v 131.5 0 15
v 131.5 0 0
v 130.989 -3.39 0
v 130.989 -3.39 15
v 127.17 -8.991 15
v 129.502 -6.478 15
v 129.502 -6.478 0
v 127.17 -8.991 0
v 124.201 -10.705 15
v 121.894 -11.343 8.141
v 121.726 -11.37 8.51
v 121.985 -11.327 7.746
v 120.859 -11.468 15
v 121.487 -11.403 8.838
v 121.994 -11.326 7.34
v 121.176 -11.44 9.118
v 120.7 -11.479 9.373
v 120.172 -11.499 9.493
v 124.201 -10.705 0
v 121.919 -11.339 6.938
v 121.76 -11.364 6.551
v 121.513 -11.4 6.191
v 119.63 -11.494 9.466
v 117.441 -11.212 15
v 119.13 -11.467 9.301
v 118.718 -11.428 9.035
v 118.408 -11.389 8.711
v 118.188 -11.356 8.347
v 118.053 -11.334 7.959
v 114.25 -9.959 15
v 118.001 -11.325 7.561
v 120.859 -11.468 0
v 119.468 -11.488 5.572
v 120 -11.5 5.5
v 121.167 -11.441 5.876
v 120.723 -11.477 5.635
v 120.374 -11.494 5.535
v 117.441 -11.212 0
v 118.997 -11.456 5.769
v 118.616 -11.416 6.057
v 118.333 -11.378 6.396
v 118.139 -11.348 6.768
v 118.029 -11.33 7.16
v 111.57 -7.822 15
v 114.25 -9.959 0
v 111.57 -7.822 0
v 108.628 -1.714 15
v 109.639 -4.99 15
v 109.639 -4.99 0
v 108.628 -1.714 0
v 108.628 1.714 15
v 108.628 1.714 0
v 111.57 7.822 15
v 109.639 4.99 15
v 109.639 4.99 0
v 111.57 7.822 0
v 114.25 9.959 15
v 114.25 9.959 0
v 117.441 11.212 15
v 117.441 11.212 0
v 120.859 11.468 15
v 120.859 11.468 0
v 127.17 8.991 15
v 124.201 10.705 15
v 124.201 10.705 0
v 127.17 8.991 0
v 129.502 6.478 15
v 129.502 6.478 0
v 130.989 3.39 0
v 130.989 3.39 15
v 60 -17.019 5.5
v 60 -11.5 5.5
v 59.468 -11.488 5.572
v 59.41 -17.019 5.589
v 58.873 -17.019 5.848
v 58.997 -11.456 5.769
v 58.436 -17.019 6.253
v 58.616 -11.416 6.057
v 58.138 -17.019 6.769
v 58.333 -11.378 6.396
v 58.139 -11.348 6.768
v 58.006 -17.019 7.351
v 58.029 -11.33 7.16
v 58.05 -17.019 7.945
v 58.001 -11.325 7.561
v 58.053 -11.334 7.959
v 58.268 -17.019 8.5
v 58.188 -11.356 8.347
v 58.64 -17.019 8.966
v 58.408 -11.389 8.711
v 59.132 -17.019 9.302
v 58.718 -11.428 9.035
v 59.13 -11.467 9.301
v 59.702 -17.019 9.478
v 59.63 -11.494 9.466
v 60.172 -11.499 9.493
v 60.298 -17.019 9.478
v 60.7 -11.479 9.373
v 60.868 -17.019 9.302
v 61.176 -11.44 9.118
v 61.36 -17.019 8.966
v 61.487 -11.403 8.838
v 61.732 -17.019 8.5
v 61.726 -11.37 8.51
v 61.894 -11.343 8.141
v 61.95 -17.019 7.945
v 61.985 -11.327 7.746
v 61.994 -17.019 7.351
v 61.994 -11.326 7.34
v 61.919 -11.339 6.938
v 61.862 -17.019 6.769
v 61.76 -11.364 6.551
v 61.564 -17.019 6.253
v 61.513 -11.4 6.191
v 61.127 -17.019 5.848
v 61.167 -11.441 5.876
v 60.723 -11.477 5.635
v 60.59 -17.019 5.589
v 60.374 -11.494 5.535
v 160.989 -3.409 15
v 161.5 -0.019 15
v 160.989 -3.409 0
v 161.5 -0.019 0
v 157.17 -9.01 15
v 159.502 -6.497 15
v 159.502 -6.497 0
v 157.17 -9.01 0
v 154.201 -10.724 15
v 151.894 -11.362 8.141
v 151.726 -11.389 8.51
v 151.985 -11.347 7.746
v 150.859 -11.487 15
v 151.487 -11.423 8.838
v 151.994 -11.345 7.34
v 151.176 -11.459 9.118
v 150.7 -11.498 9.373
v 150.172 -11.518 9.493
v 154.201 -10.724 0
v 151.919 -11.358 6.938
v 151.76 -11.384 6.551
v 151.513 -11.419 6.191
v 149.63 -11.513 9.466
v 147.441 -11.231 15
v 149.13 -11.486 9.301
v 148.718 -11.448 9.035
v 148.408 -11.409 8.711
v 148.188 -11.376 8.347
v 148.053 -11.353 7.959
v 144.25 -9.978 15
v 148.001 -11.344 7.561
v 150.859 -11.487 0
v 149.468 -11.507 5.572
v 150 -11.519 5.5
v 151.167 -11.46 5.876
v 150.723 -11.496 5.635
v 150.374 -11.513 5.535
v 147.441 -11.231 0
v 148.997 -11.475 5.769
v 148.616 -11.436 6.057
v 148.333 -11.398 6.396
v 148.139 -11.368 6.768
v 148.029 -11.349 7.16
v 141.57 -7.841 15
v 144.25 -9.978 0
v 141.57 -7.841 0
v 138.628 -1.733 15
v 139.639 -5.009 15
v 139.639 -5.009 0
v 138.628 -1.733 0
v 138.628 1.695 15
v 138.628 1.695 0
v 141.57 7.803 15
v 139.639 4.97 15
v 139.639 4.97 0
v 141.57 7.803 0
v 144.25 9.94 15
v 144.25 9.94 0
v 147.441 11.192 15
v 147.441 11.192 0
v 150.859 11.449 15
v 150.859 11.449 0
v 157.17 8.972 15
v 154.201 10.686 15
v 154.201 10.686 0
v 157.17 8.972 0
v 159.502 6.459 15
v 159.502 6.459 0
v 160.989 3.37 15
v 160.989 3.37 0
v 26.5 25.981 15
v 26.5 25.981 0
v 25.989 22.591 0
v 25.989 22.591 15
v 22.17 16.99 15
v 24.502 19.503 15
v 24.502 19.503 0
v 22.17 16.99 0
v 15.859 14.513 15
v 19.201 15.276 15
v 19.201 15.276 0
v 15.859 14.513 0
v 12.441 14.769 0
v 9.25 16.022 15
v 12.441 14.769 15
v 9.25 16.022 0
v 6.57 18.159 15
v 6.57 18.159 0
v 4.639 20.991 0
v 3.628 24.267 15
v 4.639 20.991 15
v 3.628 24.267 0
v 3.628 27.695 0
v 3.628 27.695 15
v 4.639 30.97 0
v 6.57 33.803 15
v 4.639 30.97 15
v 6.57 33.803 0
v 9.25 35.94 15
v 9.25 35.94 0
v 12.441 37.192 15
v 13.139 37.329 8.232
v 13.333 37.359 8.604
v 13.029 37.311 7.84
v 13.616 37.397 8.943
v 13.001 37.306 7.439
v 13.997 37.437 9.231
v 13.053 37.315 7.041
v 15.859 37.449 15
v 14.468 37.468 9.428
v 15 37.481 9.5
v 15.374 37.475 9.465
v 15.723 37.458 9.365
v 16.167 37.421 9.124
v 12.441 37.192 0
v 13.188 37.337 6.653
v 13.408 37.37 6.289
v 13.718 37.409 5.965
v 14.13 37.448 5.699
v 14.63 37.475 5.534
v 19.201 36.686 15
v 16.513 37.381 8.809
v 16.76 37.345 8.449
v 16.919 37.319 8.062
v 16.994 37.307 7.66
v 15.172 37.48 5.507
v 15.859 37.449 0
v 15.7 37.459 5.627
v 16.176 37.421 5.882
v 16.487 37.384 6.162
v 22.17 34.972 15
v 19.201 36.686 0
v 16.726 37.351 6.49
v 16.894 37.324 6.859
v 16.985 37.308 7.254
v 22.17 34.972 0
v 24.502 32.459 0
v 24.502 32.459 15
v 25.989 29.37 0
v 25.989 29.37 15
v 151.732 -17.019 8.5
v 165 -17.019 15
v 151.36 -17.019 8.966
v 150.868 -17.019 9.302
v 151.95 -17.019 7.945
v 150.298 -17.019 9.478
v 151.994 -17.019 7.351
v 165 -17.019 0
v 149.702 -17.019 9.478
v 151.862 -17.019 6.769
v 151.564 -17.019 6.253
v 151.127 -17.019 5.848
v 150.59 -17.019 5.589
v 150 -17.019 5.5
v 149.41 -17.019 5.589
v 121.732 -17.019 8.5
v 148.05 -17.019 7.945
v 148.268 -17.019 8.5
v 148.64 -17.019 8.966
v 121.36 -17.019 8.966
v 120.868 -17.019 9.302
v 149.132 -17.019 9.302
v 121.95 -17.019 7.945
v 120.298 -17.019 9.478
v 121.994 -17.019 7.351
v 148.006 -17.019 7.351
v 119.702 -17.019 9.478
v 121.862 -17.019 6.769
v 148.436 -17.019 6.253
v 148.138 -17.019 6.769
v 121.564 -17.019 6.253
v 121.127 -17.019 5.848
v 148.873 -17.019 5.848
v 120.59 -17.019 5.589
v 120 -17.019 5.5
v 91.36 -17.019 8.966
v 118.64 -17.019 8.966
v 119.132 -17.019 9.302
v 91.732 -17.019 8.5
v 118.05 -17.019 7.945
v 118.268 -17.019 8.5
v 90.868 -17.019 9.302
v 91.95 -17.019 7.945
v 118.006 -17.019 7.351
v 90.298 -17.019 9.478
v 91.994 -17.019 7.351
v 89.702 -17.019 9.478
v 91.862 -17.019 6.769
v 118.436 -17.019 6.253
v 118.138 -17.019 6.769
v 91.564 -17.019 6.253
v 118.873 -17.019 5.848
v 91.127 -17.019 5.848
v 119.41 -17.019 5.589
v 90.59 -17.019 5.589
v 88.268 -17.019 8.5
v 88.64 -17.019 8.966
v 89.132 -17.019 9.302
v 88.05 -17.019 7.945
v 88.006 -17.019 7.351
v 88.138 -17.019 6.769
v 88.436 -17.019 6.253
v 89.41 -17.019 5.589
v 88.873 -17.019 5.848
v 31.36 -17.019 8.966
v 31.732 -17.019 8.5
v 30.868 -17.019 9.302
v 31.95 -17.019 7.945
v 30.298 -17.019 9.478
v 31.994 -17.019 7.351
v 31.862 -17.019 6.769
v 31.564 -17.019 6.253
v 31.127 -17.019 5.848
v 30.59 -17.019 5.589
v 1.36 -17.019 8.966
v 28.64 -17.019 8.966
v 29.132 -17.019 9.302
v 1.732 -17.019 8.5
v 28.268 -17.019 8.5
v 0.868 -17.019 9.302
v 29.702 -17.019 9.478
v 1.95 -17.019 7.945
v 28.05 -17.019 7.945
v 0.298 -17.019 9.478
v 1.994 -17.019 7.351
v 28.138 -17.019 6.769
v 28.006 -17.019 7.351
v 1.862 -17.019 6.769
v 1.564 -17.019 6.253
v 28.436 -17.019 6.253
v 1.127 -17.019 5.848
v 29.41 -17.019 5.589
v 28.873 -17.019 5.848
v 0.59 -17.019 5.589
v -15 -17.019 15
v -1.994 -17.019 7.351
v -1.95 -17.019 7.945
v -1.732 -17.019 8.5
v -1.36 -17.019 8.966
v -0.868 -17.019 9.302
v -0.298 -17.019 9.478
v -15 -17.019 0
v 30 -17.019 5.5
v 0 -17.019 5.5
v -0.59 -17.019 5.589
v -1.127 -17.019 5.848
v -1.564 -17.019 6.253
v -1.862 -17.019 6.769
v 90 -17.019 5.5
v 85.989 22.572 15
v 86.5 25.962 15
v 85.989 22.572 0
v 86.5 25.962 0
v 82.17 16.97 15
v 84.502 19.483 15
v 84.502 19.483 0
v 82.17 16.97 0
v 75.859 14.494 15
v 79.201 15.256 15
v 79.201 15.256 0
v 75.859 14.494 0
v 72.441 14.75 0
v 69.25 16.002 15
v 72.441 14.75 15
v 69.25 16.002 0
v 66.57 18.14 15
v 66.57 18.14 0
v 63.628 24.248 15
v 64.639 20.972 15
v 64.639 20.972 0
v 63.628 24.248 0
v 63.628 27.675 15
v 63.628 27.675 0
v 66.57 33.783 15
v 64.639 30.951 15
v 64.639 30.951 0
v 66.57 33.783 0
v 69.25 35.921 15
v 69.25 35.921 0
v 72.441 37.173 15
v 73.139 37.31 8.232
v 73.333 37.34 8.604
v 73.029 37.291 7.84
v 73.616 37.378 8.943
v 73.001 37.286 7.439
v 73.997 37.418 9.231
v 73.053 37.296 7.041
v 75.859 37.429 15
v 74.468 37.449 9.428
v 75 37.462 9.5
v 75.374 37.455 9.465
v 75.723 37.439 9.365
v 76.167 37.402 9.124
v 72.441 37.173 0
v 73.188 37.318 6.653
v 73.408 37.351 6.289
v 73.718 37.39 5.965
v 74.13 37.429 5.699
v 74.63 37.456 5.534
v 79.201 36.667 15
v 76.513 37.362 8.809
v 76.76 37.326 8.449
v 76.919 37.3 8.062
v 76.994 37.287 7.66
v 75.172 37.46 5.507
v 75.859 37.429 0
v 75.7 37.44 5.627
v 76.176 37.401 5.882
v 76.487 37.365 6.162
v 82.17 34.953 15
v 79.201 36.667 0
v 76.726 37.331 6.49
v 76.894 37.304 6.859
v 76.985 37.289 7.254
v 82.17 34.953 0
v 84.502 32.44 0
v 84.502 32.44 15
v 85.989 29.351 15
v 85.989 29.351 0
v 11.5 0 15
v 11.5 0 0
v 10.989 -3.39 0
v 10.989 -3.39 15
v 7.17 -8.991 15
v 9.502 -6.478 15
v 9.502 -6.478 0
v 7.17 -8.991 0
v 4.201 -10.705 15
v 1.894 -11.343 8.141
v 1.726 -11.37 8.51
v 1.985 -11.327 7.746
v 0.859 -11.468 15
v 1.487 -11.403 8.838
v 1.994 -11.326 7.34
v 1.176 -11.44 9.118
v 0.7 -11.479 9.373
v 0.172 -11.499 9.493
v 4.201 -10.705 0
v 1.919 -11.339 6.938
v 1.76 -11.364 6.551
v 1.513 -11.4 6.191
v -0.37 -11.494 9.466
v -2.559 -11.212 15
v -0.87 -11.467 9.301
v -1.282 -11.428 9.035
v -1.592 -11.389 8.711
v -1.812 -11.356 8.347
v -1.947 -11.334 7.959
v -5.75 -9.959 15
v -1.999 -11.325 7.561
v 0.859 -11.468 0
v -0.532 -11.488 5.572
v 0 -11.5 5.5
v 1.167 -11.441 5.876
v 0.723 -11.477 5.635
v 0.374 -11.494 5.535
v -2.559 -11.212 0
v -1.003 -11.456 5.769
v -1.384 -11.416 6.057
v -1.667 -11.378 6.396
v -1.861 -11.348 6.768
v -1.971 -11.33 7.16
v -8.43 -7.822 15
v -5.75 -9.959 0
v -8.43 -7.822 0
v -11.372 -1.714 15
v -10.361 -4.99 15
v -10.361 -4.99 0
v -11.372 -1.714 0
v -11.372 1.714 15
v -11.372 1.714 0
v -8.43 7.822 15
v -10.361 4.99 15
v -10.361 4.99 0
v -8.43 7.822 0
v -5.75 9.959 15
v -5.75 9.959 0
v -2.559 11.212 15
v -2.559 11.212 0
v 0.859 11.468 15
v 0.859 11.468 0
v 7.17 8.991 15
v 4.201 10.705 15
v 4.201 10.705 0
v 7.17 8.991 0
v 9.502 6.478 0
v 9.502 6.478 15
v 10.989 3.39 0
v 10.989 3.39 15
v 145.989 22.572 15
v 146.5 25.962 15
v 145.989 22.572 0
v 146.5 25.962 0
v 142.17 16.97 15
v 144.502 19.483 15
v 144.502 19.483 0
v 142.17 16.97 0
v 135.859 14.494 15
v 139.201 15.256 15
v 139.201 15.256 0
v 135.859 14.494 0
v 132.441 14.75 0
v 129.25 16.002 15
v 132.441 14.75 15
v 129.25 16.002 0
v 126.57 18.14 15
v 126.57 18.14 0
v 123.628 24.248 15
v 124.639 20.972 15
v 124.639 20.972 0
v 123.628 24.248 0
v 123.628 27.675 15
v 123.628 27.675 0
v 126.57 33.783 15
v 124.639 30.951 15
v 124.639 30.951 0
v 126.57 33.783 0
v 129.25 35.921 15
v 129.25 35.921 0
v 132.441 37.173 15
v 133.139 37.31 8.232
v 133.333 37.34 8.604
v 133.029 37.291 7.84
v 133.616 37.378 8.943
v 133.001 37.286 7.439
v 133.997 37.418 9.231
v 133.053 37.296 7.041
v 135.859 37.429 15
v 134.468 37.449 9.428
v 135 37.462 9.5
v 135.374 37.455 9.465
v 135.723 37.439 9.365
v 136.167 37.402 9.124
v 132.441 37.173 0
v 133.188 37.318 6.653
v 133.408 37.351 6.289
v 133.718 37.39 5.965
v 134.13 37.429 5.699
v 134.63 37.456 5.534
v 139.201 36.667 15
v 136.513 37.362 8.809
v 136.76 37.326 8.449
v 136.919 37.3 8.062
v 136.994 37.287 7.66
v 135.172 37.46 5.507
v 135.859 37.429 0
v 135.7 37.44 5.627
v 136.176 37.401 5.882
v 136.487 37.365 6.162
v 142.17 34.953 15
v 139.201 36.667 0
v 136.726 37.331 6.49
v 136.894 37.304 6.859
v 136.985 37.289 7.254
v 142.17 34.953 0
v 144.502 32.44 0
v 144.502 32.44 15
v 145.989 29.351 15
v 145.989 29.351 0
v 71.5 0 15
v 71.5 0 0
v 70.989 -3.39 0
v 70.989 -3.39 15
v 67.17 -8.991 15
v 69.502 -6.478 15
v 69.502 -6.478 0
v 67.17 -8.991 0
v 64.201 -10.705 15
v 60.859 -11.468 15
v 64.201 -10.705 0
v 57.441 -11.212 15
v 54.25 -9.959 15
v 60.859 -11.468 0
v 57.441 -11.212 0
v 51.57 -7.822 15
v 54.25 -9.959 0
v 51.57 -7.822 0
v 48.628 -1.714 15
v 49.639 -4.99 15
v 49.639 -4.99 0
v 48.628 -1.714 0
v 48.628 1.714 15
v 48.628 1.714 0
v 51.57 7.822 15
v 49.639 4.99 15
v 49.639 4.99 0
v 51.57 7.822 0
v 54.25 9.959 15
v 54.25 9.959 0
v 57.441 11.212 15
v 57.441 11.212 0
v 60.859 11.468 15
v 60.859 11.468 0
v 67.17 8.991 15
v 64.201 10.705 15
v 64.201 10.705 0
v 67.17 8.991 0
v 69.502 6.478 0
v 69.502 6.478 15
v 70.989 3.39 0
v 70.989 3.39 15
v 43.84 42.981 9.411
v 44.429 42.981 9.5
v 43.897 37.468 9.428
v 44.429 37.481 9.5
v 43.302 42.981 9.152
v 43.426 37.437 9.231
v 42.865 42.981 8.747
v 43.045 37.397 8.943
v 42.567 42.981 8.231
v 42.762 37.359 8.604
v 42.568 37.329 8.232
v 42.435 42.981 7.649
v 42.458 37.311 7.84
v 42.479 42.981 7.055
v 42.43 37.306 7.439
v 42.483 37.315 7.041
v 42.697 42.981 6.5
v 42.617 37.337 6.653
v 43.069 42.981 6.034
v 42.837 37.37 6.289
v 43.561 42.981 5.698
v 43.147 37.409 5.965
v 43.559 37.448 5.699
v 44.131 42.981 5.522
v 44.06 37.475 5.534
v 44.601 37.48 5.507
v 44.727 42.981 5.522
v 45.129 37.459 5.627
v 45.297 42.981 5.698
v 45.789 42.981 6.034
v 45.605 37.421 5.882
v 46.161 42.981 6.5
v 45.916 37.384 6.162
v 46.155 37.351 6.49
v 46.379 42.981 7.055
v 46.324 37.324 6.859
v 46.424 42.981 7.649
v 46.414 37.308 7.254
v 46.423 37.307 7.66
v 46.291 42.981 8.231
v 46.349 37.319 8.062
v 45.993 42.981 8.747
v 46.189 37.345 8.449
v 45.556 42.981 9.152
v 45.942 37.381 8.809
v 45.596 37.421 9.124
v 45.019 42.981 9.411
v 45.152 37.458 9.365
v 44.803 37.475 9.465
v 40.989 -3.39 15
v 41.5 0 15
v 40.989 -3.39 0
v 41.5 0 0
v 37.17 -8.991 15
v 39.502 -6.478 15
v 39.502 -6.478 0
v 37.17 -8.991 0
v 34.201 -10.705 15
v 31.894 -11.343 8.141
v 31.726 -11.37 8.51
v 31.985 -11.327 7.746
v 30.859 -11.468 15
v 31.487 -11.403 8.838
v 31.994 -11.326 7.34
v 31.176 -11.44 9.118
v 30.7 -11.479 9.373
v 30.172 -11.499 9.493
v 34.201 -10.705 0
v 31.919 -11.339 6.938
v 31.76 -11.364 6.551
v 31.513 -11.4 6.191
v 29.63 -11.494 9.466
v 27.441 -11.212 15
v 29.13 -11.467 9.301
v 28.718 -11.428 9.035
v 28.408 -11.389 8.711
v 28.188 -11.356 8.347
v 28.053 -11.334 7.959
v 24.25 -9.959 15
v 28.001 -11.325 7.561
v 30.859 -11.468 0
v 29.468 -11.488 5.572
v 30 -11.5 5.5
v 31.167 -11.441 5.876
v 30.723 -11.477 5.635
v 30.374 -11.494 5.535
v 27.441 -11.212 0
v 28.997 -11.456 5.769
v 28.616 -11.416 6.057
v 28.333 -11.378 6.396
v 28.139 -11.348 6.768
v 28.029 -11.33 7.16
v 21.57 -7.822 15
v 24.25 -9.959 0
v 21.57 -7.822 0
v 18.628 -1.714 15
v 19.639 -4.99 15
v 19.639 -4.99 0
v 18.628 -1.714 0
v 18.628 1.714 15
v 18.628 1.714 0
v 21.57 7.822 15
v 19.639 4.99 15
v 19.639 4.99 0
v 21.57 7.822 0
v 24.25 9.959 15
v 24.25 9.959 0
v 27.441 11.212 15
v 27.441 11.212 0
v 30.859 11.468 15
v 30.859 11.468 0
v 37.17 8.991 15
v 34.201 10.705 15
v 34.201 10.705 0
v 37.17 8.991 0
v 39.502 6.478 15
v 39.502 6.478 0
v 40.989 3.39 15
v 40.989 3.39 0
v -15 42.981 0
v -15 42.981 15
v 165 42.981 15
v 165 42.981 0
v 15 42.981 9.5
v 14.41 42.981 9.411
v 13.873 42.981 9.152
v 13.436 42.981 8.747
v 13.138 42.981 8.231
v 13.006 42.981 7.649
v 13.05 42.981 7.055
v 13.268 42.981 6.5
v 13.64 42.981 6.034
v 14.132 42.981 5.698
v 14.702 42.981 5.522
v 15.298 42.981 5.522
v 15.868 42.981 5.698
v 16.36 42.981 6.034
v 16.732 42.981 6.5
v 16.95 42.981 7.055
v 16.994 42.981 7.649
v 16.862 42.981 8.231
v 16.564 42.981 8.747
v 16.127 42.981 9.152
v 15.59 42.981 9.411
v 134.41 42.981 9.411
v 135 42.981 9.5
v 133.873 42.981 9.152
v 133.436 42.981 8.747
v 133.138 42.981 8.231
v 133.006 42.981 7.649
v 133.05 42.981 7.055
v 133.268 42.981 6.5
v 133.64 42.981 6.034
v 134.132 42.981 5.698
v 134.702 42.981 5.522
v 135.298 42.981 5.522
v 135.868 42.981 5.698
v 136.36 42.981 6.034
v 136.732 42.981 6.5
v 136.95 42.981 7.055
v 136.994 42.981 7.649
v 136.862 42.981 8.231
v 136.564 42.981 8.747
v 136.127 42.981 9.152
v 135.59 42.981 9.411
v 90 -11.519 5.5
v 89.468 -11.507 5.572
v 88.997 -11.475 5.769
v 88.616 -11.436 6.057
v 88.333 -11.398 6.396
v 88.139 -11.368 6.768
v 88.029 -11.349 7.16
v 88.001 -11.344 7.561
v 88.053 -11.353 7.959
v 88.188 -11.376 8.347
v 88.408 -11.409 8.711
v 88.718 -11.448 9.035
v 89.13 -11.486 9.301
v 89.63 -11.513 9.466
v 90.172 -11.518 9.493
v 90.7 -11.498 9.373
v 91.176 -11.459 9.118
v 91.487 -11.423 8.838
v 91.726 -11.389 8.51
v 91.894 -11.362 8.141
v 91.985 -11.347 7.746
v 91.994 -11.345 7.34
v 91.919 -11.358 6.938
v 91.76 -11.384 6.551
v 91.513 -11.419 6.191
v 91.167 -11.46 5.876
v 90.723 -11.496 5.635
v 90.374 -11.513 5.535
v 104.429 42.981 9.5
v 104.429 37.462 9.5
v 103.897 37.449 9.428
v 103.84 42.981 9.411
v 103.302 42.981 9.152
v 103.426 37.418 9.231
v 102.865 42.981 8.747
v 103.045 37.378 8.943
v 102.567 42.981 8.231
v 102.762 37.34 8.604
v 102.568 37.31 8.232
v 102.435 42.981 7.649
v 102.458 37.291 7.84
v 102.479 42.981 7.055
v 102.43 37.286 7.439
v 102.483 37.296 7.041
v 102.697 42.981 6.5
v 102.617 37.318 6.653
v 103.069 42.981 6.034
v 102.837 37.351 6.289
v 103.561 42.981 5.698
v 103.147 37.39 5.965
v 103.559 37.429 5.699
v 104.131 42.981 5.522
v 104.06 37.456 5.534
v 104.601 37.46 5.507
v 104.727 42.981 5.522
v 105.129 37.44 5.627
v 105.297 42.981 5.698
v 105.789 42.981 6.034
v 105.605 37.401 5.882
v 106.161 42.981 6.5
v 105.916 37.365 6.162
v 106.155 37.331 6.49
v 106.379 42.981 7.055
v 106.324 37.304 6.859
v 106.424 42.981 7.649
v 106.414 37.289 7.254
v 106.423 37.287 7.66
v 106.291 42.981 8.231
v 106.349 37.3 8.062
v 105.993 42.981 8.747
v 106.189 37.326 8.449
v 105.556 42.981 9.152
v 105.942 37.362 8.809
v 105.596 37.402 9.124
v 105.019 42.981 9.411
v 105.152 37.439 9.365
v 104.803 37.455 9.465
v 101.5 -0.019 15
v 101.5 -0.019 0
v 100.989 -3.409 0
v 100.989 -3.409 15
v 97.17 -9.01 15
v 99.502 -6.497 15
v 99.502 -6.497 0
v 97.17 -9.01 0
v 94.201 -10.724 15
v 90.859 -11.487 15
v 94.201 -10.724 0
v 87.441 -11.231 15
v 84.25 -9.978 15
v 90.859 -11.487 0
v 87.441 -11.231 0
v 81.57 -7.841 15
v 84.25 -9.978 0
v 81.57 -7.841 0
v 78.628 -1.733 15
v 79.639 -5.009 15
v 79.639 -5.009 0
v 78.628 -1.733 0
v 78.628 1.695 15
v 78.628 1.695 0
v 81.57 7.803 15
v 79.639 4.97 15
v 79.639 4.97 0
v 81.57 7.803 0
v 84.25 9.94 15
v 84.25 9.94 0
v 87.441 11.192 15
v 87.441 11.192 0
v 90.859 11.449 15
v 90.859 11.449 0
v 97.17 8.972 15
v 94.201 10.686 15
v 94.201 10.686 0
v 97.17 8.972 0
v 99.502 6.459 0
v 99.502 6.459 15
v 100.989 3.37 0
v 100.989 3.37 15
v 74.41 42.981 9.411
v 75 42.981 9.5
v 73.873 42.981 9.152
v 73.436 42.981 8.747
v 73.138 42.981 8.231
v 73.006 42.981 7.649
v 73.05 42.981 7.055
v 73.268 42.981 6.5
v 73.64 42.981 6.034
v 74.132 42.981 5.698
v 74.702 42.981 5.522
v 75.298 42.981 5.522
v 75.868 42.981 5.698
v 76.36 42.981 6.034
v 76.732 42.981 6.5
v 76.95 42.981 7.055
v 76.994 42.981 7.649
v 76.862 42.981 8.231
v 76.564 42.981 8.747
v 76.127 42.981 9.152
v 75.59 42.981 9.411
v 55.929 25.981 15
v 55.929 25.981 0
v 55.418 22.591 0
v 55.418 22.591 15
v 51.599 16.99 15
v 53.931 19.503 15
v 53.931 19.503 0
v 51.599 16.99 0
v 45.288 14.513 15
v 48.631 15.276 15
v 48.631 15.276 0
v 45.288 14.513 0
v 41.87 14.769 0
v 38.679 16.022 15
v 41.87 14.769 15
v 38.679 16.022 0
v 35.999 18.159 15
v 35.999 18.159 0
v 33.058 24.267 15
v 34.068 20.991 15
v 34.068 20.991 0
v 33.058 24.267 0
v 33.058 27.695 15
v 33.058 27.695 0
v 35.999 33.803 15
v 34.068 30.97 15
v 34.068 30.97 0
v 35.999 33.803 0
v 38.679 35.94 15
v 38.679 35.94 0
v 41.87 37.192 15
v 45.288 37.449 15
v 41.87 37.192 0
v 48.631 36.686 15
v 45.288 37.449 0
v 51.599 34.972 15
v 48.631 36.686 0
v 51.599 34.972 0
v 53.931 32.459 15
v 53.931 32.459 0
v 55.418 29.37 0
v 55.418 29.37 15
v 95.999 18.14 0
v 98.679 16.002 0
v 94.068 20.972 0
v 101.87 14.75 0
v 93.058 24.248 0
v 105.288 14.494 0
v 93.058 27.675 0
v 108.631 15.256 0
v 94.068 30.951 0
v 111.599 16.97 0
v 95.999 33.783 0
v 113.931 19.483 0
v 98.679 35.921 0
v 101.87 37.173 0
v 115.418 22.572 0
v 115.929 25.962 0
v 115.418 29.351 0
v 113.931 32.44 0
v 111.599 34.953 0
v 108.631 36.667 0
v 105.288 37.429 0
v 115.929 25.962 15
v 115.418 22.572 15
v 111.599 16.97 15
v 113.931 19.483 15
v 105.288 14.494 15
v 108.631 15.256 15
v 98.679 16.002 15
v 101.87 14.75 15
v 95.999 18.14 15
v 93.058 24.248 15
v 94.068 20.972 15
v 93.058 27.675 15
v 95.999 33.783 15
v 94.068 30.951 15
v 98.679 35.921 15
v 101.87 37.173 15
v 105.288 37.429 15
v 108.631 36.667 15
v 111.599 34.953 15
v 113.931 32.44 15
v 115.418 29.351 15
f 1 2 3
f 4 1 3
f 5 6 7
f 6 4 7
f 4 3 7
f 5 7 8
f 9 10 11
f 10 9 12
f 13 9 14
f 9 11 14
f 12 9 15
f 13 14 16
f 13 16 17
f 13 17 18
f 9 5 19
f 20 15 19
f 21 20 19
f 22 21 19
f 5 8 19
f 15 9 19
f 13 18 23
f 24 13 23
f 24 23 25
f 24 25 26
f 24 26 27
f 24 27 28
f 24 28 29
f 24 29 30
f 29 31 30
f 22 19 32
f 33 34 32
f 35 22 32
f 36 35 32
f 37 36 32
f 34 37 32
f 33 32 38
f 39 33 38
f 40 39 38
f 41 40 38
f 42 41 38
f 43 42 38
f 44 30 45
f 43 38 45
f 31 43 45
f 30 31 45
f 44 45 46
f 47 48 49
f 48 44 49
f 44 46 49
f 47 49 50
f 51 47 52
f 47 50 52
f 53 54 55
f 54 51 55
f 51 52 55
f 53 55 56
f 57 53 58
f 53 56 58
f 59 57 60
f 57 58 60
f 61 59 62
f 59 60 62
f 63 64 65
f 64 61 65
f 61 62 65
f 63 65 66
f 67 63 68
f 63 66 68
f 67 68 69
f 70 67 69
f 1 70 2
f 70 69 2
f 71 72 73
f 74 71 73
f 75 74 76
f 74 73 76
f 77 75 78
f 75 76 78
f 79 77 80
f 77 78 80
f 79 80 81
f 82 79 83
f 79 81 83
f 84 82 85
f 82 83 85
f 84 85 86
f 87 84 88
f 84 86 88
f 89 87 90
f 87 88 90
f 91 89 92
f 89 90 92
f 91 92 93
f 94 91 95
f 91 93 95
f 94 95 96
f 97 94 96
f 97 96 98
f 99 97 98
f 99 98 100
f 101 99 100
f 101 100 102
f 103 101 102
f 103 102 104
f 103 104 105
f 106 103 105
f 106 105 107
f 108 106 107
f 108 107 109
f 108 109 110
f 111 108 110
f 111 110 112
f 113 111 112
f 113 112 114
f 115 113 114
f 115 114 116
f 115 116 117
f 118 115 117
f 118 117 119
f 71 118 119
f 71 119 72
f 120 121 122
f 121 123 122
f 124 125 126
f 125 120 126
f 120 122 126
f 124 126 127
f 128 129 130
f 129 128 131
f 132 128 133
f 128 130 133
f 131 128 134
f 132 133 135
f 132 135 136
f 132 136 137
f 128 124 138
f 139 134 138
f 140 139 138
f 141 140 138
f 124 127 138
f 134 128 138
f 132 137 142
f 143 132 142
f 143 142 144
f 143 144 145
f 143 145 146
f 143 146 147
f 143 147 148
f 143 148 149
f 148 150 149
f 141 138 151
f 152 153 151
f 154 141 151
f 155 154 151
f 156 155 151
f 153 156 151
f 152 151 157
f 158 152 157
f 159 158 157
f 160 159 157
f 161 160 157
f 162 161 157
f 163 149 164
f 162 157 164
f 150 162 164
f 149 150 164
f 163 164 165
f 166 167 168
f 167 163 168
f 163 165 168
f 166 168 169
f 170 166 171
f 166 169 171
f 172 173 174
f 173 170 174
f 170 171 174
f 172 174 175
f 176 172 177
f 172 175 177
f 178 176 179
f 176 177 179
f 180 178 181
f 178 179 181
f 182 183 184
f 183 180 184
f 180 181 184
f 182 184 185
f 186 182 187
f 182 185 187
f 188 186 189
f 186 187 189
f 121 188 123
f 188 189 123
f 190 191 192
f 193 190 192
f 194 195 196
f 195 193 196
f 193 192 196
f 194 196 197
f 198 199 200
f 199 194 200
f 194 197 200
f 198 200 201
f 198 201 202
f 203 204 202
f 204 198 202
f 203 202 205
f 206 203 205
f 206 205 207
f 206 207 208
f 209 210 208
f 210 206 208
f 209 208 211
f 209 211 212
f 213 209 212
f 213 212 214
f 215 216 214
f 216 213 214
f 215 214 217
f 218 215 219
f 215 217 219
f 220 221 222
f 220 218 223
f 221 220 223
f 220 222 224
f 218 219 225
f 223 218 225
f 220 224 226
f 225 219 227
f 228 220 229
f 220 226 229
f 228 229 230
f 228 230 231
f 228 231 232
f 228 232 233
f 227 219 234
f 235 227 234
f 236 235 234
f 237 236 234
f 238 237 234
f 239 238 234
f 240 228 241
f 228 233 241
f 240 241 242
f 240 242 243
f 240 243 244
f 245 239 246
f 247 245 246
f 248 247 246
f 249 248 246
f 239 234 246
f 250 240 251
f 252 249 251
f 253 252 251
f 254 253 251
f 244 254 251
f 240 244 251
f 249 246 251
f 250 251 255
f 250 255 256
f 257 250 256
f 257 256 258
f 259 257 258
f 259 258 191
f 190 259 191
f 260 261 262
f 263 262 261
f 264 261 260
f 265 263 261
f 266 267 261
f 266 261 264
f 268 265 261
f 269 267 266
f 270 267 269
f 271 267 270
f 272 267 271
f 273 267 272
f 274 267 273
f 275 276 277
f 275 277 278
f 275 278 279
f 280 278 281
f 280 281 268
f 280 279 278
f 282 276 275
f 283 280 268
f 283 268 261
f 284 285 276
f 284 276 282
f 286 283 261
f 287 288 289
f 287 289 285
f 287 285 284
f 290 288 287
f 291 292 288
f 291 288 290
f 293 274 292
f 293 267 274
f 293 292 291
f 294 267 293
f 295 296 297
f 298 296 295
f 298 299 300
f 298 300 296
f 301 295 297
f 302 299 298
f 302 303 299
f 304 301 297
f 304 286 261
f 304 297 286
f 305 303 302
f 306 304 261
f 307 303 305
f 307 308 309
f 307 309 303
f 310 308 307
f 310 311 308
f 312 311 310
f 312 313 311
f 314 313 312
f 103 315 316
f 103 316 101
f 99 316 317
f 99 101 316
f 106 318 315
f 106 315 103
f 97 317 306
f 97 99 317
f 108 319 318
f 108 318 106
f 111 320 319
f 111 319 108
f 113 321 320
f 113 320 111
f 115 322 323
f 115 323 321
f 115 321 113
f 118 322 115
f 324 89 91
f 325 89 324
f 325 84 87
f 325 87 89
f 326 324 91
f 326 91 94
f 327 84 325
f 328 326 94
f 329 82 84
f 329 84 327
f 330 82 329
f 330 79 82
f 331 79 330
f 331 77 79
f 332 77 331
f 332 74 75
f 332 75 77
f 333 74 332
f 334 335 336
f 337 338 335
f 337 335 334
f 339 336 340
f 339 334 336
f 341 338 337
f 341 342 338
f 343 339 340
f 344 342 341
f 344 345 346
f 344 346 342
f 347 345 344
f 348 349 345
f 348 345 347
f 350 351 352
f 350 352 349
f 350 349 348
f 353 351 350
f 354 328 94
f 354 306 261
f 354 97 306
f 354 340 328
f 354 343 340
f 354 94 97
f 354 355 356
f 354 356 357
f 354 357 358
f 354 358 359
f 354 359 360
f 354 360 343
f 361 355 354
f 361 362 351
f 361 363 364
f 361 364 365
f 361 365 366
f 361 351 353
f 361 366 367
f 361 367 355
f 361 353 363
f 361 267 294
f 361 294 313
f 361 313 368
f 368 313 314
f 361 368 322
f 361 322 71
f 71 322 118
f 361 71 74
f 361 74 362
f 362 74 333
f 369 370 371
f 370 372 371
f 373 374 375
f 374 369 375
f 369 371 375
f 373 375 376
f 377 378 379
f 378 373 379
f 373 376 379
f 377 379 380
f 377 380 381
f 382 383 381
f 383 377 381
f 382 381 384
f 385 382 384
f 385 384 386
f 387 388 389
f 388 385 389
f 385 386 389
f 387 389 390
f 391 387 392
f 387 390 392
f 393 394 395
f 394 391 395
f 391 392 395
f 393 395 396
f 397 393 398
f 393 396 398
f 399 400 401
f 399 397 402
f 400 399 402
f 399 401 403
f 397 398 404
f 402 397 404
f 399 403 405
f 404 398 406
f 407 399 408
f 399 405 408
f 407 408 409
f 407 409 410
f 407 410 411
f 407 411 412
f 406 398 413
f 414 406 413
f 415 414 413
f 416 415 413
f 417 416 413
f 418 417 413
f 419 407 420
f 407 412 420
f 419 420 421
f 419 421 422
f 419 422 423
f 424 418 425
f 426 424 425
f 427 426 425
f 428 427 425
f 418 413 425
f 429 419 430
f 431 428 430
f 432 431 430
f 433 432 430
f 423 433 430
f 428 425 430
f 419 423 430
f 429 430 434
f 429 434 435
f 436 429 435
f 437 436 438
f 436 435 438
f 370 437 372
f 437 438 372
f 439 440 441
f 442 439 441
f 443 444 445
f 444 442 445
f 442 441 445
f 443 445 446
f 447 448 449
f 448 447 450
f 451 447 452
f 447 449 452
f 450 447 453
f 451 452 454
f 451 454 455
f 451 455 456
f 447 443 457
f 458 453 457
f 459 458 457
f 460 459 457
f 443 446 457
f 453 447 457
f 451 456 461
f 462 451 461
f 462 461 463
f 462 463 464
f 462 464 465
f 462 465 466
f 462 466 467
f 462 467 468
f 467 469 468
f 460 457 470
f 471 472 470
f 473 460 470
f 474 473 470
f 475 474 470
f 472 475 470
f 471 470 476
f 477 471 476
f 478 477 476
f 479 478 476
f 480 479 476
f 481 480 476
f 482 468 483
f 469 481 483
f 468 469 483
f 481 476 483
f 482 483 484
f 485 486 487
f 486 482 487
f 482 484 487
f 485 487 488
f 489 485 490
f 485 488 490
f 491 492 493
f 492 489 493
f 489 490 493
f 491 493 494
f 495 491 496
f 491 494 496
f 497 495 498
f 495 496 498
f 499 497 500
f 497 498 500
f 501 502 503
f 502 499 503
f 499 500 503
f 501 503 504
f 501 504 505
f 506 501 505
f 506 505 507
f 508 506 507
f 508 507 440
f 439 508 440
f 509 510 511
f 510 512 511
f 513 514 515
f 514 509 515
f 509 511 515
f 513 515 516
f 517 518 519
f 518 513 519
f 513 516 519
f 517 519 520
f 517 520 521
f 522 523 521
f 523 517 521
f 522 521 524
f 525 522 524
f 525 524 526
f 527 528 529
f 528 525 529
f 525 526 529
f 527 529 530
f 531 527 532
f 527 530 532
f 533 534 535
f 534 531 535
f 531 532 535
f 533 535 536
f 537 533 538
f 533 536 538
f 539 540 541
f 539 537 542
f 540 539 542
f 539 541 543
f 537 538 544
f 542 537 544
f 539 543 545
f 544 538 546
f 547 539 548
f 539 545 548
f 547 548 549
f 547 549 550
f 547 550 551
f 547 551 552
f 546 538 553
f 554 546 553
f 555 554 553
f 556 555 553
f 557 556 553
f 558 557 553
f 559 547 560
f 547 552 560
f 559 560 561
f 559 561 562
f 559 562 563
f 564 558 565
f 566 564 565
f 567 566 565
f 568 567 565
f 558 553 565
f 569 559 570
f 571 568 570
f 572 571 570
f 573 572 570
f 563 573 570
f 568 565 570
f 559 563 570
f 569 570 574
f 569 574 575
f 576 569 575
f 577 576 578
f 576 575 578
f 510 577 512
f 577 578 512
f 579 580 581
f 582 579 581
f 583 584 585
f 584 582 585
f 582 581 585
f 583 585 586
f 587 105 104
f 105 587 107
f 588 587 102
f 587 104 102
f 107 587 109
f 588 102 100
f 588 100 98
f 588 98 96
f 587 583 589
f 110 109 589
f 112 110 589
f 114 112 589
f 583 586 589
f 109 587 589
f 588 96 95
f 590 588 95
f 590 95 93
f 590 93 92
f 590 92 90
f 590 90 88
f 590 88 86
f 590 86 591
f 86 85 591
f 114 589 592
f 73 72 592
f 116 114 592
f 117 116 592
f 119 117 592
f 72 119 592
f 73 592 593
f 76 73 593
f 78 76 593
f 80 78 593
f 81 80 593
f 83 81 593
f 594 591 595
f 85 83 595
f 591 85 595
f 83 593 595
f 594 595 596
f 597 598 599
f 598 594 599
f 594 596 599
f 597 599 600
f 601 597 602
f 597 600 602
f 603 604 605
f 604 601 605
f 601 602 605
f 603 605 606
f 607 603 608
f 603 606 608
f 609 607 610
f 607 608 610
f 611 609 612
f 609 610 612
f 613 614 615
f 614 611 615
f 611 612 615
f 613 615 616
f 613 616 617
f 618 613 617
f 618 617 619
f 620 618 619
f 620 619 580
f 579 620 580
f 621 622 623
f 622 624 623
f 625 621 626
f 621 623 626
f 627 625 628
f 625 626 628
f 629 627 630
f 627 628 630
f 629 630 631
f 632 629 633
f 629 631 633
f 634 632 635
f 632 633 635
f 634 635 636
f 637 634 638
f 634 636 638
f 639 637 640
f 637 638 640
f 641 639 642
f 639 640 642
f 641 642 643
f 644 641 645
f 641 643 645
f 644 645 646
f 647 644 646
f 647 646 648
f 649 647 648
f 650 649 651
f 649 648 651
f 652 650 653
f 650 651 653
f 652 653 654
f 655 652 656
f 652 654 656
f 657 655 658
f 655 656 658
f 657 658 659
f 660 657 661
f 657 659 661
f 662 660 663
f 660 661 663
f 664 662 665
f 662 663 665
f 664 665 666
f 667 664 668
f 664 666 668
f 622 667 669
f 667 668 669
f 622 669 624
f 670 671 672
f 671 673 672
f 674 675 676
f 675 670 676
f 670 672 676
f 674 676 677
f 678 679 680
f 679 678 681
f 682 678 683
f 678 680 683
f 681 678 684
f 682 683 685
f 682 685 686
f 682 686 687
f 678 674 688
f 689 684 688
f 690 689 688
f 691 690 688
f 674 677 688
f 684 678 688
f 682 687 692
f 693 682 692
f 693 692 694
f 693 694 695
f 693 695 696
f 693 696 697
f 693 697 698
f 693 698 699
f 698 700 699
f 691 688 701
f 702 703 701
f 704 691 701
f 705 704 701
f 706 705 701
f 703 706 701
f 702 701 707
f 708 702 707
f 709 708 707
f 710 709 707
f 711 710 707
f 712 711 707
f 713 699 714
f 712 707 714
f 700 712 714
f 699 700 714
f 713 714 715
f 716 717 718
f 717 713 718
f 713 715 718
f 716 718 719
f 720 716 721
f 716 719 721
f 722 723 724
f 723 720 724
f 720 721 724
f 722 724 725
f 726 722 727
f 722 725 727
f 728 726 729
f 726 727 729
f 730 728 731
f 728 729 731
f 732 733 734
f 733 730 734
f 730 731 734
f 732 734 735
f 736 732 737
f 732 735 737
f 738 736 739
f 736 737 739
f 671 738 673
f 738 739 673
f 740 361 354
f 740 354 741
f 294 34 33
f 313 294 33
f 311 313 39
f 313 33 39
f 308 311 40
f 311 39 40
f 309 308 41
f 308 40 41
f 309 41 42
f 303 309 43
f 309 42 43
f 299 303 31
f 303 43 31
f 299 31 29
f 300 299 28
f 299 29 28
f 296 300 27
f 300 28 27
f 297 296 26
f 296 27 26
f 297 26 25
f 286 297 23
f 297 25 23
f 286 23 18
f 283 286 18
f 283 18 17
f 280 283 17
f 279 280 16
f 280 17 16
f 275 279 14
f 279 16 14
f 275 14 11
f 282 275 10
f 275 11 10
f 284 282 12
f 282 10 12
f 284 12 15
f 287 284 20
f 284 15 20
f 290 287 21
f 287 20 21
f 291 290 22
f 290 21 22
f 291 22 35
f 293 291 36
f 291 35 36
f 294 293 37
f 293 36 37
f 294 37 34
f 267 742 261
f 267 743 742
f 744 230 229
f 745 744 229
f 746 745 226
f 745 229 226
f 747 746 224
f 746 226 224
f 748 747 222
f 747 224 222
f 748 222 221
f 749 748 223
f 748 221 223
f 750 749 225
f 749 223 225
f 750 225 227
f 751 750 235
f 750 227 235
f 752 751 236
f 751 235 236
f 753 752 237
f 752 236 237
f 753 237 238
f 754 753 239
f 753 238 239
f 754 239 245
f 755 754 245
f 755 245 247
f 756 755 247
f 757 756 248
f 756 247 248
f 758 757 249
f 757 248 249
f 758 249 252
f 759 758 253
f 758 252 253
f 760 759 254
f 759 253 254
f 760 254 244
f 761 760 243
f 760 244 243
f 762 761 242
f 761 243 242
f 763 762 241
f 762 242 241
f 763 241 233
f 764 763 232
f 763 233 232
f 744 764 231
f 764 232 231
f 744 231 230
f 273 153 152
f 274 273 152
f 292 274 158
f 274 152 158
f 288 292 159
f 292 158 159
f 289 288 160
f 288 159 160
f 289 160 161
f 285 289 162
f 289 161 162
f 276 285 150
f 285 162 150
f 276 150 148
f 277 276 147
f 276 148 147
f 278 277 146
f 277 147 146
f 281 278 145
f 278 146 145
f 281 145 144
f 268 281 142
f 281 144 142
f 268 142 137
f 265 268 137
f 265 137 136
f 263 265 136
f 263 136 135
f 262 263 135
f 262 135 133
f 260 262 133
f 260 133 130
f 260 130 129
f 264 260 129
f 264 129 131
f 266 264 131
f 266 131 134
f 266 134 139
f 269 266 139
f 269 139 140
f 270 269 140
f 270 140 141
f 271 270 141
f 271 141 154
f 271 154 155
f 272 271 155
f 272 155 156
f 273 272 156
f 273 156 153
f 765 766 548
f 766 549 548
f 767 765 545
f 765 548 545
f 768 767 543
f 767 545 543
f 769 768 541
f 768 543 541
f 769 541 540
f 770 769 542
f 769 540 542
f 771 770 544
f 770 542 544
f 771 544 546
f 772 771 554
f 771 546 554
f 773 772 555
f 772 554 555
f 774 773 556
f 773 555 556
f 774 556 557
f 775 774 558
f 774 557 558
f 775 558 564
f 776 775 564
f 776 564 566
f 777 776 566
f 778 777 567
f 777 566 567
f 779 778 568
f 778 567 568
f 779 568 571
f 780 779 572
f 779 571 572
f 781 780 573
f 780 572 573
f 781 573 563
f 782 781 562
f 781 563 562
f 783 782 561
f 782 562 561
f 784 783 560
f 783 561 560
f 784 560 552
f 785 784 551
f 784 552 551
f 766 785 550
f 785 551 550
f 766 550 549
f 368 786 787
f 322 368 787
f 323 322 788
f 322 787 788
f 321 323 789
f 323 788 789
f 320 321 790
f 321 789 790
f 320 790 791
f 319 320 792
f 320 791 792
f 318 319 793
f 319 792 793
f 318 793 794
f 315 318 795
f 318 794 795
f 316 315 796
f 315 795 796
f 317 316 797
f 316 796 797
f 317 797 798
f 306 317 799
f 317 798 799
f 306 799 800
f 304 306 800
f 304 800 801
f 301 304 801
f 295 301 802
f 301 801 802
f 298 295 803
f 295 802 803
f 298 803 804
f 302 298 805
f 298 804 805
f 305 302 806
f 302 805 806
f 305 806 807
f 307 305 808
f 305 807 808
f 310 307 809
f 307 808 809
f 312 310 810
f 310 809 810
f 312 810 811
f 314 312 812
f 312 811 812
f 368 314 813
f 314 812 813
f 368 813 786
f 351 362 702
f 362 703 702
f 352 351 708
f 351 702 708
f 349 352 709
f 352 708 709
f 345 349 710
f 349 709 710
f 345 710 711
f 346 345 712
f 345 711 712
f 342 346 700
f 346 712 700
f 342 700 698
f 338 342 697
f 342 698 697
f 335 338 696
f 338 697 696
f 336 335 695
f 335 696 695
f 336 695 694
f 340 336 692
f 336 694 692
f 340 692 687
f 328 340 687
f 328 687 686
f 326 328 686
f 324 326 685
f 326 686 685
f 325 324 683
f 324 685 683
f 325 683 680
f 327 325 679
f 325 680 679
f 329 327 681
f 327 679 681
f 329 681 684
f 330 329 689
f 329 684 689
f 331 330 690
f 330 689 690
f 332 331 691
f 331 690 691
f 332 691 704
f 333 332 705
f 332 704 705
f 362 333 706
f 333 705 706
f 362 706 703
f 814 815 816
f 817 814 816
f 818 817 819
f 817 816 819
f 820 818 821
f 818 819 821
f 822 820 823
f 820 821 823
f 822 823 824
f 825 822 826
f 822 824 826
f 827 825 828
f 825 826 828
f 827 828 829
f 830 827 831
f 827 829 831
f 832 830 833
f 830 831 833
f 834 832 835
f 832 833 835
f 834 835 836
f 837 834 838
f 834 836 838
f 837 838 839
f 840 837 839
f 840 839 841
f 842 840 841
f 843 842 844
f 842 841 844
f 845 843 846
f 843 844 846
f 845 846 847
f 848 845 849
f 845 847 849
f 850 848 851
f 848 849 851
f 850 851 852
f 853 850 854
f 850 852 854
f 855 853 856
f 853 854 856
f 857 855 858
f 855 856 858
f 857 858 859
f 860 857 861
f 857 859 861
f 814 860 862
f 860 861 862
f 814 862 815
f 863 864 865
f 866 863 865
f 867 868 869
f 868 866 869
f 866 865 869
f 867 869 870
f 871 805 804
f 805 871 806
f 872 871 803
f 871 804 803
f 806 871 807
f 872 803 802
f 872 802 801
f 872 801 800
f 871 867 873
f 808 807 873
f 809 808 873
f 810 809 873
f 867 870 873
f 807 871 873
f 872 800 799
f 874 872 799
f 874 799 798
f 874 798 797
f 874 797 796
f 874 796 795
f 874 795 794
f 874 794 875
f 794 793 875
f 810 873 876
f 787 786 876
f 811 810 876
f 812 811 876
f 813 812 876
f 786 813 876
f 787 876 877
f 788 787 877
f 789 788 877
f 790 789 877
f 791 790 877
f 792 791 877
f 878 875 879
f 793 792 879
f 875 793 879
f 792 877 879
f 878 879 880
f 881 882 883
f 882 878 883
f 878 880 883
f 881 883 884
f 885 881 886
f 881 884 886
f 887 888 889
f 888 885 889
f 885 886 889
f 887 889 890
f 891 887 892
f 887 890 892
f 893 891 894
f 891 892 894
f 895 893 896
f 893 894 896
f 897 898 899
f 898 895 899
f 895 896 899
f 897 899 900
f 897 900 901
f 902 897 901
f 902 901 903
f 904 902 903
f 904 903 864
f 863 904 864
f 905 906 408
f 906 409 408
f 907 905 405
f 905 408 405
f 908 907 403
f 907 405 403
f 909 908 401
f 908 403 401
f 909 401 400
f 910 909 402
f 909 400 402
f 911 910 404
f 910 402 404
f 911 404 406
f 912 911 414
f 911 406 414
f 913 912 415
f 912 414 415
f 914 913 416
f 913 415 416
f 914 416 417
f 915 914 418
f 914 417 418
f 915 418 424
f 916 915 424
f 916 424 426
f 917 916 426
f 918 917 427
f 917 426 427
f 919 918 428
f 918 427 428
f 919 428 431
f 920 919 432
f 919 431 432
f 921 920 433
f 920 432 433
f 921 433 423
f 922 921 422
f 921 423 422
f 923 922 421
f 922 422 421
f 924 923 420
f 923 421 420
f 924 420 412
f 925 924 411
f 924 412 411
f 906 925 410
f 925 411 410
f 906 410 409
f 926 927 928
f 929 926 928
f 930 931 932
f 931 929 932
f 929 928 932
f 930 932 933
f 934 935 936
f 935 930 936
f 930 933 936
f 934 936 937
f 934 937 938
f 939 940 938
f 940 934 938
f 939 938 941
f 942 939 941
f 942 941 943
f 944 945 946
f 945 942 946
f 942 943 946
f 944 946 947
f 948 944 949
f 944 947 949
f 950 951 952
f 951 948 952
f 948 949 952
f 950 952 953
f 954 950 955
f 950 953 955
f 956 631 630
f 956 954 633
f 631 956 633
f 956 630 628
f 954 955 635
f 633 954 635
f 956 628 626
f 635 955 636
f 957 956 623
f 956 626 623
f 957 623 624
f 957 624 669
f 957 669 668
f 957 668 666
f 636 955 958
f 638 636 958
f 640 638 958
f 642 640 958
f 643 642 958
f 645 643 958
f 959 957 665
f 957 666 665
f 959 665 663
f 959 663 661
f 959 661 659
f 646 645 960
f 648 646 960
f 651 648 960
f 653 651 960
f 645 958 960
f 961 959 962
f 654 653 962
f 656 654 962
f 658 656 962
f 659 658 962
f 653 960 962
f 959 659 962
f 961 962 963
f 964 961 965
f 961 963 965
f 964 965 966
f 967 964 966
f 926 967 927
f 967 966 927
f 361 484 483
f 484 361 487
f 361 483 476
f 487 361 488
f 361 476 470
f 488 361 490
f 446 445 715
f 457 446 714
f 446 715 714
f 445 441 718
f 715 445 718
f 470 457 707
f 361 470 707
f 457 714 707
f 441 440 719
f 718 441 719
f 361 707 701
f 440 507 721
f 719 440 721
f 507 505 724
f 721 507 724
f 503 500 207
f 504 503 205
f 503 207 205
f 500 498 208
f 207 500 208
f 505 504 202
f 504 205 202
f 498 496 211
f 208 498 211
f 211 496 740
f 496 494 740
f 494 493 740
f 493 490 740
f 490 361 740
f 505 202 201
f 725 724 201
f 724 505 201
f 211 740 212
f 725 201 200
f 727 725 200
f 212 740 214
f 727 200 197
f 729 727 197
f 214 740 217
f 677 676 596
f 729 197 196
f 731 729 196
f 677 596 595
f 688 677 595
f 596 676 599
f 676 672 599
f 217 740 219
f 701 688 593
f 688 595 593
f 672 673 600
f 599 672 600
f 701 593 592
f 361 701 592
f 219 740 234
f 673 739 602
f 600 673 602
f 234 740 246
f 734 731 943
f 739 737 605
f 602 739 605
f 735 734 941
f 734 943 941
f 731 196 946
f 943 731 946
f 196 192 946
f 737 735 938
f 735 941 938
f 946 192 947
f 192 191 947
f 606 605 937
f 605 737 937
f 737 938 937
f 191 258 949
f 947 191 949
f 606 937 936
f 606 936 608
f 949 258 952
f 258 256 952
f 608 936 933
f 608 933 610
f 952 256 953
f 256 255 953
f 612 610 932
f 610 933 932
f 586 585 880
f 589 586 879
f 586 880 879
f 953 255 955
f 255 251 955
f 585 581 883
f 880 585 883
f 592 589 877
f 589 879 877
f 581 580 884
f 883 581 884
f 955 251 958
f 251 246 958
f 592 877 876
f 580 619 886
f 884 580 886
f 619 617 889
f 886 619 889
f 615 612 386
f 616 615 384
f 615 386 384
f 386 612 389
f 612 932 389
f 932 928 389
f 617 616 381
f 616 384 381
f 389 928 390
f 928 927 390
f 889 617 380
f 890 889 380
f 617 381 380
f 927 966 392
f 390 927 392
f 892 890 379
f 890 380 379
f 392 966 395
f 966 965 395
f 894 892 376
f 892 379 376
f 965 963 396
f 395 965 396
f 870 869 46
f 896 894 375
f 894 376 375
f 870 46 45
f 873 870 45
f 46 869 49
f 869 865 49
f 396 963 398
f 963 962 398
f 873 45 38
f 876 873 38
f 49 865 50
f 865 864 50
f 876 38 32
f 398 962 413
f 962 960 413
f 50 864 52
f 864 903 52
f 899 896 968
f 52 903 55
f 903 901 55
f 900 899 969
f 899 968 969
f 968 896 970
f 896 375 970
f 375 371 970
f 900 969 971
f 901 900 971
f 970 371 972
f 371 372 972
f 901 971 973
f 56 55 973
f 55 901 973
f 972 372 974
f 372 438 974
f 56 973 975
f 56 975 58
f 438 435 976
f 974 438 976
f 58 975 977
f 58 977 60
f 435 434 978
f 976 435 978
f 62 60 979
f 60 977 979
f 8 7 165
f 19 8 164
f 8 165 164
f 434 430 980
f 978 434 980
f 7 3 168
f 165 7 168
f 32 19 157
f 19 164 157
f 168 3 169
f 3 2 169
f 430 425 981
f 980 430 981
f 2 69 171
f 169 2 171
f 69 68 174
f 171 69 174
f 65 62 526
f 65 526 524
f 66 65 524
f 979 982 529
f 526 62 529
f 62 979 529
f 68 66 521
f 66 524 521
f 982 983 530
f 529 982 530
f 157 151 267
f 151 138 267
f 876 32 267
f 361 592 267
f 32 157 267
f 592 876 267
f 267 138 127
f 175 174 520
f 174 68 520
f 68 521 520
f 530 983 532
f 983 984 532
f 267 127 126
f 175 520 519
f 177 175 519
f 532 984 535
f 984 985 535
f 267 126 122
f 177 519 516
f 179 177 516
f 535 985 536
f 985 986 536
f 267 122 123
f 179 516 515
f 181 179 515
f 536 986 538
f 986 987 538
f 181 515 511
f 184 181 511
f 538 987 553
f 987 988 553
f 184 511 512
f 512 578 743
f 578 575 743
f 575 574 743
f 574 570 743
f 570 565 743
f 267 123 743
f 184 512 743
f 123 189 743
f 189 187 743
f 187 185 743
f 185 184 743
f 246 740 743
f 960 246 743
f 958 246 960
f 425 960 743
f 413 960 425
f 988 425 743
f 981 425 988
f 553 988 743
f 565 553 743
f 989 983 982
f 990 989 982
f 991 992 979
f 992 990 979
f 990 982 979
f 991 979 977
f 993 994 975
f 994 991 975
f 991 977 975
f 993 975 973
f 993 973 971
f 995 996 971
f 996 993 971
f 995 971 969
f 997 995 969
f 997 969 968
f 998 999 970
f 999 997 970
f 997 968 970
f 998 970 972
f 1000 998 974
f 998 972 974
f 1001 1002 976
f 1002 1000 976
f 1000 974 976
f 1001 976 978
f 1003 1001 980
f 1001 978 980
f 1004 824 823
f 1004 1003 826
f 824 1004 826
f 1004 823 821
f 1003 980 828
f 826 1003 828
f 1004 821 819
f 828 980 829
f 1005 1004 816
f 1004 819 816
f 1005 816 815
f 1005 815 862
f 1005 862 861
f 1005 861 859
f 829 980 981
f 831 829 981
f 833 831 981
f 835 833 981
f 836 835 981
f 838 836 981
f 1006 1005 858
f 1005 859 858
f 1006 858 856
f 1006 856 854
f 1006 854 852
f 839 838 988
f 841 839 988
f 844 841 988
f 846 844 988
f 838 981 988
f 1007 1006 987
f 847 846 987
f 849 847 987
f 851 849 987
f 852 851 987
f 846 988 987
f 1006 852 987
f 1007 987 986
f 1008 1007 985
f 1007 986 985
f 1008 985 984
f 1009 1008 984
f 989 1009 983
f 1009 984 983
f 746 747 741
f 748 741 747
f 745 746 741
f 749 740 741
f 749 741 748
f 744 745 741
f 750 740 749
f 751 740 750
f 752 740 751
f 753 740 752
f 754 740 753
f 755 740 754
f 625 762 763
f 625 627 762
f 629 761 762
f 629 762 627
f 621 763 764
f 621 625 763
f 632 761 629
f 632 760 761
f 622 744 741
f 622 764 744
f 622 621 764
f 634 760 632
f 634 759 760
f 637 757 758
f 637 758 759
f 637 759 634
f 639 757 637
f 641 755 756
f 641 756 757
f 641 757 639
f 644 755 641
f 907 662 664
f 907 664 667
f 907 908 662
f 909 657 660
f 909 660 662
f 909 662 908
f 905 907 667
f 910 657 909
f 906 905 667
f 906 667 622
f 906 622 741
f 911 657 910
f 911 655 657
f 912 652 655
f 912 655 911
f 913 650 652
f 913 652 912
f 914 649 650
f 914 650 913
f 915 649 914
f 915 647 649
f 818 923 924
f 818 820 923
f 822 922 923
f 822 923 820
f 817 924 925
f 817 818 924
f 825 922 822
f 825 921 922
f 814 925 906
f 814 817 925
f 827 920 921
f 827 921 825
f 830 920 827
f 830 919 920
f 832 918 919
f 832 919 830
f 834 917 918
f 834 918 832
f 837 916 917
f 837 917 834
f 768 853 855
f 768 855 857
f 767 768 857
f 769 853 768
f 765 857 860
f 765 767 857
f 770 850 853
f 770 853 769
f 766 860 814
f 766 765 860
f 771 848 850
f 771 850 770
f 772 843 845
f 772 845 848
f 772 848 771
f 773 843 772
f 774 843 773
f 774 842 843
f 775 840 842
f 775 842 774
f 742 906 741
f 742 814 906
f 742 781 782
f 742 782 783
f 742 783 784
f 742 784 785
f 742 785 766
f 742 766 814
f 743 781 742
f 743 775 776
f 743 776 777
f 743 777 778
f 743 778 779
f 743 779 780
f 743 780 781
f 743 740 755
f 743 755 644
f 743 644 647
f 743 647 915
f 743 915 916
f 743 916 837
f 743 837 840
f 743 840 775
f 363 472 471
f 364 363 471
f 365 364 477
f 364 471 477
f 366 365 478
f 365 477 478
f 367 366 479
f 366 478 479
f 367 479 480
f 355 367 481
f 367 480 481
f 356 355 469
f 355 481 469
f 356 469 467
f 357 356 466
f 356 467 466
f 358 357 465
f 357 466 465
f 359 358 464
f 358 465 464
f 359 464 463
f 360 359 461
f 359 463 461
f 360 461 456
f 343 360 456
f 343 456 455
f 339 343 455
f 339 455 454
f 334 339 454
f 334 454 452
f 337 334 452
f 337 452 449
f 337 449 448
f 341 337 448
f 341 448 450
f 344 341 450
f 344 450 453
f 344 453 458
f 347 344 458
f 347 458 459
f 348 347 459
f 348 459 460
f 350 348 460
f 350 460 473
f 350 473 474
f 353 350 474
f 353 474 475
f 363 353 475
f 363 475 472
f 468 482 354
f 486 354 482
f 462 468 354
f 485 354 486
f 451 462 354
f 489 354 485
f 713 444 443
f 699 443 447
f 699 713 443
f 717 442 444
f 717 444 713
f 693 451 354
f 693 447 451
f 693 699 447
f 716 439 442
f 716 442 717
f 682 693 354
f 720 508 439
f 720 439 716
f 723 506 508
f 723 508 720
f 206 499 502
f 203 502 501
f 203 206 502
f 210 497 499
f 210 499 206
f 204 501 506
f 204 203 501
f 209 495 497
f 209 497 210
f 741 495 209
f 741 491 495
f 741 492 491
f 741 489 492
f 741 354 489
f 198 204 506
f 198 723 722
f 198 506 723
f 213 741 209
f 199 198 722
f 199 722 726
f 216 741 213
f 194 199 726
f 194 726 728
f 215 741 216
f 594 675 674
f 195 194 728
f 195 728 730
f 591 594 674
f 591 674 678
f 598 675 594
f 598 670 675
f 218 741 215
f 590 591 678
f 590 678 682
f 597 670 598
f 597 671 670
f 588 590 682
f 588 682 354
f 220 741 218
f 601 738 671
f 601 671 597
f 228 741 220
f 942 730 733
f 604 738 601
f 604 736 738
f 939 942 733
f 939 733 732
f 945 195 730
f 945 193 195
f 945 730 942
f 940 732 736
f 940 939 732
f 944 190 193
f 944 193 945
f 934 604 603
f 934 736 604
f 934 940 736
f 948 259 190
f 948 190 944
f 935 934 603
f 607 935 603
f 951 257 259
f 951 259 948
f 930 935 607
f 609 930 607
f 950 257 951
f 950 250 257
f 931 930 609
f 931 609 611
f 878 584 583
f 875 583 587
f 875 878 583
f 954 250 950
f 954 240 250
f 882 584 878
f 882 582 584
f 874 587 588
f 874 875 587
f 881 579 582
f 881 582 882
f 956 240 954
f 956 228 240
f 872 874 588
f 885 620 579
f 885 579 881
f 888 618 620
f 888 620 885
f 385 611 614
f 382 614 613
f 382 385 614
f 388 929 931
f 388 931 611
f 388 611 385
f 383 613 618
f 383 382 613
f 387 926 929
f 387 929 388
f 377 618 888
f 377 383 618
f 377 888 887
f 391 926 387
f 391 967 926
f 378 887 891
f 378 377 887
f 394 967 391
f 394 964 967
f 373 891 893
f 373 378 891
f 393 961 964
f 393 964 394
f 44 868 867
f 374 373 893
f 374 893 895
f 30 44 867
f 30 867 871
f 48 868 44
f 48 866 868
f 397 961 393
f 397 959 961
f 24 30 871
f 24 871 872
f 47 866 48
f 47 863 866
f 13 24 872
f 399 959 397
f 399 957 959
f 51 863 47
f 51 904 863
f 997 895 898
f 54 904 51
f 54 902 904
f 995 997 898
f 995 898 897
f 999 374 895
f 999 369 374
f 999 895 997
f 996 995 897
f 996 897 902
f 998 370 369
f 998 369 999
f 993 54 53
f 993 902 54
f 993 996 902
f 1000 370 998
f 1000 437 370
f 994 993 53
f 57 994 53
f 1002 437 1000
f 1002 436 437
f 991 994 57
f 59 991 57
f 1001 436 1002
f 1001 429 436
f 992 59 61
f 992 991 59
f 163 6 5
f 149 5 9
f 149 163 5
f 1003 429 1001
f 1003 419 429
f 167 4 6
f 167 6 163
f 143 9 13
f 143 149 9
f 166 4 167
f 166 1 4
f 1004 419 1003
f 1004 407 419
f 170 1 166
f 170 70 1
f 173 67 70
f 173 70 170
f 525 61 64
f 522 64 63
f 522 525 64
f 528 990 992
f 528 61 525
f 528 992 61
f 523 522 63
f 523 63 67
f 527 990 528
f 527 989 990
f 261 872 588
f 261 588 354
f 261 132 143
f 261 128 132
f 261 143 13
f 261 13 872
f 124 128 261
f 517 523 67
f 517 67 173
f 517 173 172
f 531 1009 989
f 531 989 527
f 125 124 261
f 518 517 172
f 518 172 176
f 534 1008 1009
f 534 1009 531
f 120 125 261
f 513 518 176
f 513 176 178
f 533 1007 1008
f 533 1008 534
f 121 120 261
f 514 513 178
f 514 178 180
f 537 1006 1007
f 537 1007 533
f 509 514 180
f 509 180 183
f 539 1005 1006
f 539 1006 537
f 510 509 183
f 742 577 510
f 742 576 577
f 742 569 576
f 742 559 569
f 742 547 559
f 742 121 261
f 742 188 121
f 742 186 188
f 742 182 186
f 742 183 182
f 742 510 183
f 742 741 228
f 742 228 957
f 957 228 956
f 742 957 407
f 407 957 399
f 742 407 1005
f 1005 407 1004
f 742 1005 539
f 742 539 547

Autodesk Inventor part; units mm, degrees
ref_plane "YZ Plane" through (0, 0, 0) normal (1, 0, 0) x (0, 1, 0)
ref_plane "XZ Plane" through (0, 0, 0) normal (0, 1, 0) x (-1, 0, 0)
ref_plane "XY Plane" through (0, 0, 0) normal (0, 0, 1) x (1, 0, 0)
sketch "Skizze1" plane through (0, 0, 0) normal (0, 0, 1) x (1, 0, 0)
  circle A0 centre (0, 0) radius 11.5
  circle A1 centre (15, 25.9808) radius 11.5
  circle A2 centre (30, 0) radius 11.5
  circle A3 centre (44.4291, 25.9808) radius 11.5
  circle A4 centre (60, 0) radius 11.5
  circle A5 centre (75, 25.9615) radius 11.5
  circle A6 centre (90, -0.0192) radius 11.5
  circle A7 centre (104.4291, 25.9615) radius 11.5
  circle A8 centre (120, 0) radius 11.5
  circle A9 centre (135, 25.9615) radius 11.5
  circle A10 centre (150, -0.0192) radius 11.5
  line L0 (-15, 42.9808) -> (165, 42.9808)
  line L1 (165, 42.9808) -> (165, -17.0192)
  line L2 (165, -17.0192) -> (-15, -17.0192)
  line L3 (-15, -17.0192) -> (-15, 42.9808)
  dimension "d0" = 23
  dimension "d2" = 23
  dimension "d3" = 30
  dimension "d4" = 23
  dimension "d7" = 30
  dimension "d8" = 30
  dimension "d9" = 23
  dimension "d10" = 29.4291
  dimension "d11" = 23
  dimension "d12" = 23
  dimension "d13" = 23
  dimension "d14" = 30
  dimension "d15" = 23
  dimension "d16" = 29.4291
  dimension "d24" = 23
  dimension "d25" = 23
  dimension "d26" = 23
  dimension "d27" = 30
  dimension "d28" = 15
  dimension "d31" = 15
  dimension "d36" = 180
  dimension "d98" = 60
  dimension "d99" = 5.5
  dimension "d100" = 52.4567
  dimension "d101" = 5.5192
  dimension "d102" = 5.5
  dimension "d103" = 5.5
extrude "Extrusion1" add sketch "Skizze1" along normal blind 15
hole "Bohrung1" at (120, -17.0192, 7.5) at (30, -17.0192, 7.5) at (0, -17.0192, 7.5) at (60, -17.0192, 7.5) at (150, -17.0192, 7.5) at (90, -17.0192, 7.5) direction (0, 1, 0) diameter 4 depth 8
thread "Gewinde2" size "M4x0.7" class "6H" standard "ANSI Metric M Profile" full length
thread "Gewinde3" size "M4x0.7" class "6H" standard "ANSI Metric M Profile" full length
sketch "Skizze4" plane through (-15, 42.9808, 0) normal (0, 1, 0) x (1, 0, 0)
  line L0 (180, 0) -> (180, -15) projected
  line L1 (150, 13) -> (150, -28.8024) construction
  line L2 (30, 13) -> (30, -28.8024) construction
  line L3 (119.4291, 13) -> (119.4291, -28.8024) construction
  line L4 (90, 13) -> (90, -28.8024) construction
  line L5 (59.4291, 13) -> (59.4291, -28.8024) construction
  line L6 (180, -15) -> (0, -15) projected
  line L7 (0, -15) -> (180, 0) construction
  line L8 (180, -15) -> (0, 0) construction
  line L9 (4.4998, -7.5) -> (175.5002, -7.5) construction
  point P0 (15, 0)
  point P1 (119.4291, -7.5)
  point P2 (150, -7.5)
  point P3 (90, -7.5)
  point P4 (59.4291, -7.5)
  point P5 (30, -7.5)
  point P6 (90, -7.5)
  point P7 (90, -7.5)
  dimension "d58" = 30
  dimension "d60" = 60.5709
  dimension "d62" = 90
  dimension "d64" = 120.5709
  dimension "d66" = 150
  dimension "d85" = 0
  dimension "d86" = 0
  dimension "d87" = 0
  dimension "d88" = 0
  dimension "d89" = 0
hole "Bohrung2" at (104.4291, 42.9808, 7.5) at (135, 42.9808, 7.5) at (75, 42.9808, 7.5) at (44.4291, 42.9808, 7.5) at (15, 42.9808, 7.5) direction (0, -1, 0) diameter 4 depth 8 tip angle 118
thread "Gewinde4" size "M4x0.7" class "6H" standard "ANSI Metric M Profile" full length
thread "Gewinde5" size "M4x0.7" class "6H" standard "ANSI Metric M Profile" full length
thread "Gewinde6" size "M4x0.7" class "6H" standard "ANSI Metric M Profile" full length
thread "Gewinde7" size "M4x0.7" class "6H" standard "ANSI Metric M Profile" full length
thread "Gewinde8" size "M4x0.7" class "6H" standard "ANSI Metric M Profile" full length
properties part number "Ventilhalter" material "Aluminium 6061"
